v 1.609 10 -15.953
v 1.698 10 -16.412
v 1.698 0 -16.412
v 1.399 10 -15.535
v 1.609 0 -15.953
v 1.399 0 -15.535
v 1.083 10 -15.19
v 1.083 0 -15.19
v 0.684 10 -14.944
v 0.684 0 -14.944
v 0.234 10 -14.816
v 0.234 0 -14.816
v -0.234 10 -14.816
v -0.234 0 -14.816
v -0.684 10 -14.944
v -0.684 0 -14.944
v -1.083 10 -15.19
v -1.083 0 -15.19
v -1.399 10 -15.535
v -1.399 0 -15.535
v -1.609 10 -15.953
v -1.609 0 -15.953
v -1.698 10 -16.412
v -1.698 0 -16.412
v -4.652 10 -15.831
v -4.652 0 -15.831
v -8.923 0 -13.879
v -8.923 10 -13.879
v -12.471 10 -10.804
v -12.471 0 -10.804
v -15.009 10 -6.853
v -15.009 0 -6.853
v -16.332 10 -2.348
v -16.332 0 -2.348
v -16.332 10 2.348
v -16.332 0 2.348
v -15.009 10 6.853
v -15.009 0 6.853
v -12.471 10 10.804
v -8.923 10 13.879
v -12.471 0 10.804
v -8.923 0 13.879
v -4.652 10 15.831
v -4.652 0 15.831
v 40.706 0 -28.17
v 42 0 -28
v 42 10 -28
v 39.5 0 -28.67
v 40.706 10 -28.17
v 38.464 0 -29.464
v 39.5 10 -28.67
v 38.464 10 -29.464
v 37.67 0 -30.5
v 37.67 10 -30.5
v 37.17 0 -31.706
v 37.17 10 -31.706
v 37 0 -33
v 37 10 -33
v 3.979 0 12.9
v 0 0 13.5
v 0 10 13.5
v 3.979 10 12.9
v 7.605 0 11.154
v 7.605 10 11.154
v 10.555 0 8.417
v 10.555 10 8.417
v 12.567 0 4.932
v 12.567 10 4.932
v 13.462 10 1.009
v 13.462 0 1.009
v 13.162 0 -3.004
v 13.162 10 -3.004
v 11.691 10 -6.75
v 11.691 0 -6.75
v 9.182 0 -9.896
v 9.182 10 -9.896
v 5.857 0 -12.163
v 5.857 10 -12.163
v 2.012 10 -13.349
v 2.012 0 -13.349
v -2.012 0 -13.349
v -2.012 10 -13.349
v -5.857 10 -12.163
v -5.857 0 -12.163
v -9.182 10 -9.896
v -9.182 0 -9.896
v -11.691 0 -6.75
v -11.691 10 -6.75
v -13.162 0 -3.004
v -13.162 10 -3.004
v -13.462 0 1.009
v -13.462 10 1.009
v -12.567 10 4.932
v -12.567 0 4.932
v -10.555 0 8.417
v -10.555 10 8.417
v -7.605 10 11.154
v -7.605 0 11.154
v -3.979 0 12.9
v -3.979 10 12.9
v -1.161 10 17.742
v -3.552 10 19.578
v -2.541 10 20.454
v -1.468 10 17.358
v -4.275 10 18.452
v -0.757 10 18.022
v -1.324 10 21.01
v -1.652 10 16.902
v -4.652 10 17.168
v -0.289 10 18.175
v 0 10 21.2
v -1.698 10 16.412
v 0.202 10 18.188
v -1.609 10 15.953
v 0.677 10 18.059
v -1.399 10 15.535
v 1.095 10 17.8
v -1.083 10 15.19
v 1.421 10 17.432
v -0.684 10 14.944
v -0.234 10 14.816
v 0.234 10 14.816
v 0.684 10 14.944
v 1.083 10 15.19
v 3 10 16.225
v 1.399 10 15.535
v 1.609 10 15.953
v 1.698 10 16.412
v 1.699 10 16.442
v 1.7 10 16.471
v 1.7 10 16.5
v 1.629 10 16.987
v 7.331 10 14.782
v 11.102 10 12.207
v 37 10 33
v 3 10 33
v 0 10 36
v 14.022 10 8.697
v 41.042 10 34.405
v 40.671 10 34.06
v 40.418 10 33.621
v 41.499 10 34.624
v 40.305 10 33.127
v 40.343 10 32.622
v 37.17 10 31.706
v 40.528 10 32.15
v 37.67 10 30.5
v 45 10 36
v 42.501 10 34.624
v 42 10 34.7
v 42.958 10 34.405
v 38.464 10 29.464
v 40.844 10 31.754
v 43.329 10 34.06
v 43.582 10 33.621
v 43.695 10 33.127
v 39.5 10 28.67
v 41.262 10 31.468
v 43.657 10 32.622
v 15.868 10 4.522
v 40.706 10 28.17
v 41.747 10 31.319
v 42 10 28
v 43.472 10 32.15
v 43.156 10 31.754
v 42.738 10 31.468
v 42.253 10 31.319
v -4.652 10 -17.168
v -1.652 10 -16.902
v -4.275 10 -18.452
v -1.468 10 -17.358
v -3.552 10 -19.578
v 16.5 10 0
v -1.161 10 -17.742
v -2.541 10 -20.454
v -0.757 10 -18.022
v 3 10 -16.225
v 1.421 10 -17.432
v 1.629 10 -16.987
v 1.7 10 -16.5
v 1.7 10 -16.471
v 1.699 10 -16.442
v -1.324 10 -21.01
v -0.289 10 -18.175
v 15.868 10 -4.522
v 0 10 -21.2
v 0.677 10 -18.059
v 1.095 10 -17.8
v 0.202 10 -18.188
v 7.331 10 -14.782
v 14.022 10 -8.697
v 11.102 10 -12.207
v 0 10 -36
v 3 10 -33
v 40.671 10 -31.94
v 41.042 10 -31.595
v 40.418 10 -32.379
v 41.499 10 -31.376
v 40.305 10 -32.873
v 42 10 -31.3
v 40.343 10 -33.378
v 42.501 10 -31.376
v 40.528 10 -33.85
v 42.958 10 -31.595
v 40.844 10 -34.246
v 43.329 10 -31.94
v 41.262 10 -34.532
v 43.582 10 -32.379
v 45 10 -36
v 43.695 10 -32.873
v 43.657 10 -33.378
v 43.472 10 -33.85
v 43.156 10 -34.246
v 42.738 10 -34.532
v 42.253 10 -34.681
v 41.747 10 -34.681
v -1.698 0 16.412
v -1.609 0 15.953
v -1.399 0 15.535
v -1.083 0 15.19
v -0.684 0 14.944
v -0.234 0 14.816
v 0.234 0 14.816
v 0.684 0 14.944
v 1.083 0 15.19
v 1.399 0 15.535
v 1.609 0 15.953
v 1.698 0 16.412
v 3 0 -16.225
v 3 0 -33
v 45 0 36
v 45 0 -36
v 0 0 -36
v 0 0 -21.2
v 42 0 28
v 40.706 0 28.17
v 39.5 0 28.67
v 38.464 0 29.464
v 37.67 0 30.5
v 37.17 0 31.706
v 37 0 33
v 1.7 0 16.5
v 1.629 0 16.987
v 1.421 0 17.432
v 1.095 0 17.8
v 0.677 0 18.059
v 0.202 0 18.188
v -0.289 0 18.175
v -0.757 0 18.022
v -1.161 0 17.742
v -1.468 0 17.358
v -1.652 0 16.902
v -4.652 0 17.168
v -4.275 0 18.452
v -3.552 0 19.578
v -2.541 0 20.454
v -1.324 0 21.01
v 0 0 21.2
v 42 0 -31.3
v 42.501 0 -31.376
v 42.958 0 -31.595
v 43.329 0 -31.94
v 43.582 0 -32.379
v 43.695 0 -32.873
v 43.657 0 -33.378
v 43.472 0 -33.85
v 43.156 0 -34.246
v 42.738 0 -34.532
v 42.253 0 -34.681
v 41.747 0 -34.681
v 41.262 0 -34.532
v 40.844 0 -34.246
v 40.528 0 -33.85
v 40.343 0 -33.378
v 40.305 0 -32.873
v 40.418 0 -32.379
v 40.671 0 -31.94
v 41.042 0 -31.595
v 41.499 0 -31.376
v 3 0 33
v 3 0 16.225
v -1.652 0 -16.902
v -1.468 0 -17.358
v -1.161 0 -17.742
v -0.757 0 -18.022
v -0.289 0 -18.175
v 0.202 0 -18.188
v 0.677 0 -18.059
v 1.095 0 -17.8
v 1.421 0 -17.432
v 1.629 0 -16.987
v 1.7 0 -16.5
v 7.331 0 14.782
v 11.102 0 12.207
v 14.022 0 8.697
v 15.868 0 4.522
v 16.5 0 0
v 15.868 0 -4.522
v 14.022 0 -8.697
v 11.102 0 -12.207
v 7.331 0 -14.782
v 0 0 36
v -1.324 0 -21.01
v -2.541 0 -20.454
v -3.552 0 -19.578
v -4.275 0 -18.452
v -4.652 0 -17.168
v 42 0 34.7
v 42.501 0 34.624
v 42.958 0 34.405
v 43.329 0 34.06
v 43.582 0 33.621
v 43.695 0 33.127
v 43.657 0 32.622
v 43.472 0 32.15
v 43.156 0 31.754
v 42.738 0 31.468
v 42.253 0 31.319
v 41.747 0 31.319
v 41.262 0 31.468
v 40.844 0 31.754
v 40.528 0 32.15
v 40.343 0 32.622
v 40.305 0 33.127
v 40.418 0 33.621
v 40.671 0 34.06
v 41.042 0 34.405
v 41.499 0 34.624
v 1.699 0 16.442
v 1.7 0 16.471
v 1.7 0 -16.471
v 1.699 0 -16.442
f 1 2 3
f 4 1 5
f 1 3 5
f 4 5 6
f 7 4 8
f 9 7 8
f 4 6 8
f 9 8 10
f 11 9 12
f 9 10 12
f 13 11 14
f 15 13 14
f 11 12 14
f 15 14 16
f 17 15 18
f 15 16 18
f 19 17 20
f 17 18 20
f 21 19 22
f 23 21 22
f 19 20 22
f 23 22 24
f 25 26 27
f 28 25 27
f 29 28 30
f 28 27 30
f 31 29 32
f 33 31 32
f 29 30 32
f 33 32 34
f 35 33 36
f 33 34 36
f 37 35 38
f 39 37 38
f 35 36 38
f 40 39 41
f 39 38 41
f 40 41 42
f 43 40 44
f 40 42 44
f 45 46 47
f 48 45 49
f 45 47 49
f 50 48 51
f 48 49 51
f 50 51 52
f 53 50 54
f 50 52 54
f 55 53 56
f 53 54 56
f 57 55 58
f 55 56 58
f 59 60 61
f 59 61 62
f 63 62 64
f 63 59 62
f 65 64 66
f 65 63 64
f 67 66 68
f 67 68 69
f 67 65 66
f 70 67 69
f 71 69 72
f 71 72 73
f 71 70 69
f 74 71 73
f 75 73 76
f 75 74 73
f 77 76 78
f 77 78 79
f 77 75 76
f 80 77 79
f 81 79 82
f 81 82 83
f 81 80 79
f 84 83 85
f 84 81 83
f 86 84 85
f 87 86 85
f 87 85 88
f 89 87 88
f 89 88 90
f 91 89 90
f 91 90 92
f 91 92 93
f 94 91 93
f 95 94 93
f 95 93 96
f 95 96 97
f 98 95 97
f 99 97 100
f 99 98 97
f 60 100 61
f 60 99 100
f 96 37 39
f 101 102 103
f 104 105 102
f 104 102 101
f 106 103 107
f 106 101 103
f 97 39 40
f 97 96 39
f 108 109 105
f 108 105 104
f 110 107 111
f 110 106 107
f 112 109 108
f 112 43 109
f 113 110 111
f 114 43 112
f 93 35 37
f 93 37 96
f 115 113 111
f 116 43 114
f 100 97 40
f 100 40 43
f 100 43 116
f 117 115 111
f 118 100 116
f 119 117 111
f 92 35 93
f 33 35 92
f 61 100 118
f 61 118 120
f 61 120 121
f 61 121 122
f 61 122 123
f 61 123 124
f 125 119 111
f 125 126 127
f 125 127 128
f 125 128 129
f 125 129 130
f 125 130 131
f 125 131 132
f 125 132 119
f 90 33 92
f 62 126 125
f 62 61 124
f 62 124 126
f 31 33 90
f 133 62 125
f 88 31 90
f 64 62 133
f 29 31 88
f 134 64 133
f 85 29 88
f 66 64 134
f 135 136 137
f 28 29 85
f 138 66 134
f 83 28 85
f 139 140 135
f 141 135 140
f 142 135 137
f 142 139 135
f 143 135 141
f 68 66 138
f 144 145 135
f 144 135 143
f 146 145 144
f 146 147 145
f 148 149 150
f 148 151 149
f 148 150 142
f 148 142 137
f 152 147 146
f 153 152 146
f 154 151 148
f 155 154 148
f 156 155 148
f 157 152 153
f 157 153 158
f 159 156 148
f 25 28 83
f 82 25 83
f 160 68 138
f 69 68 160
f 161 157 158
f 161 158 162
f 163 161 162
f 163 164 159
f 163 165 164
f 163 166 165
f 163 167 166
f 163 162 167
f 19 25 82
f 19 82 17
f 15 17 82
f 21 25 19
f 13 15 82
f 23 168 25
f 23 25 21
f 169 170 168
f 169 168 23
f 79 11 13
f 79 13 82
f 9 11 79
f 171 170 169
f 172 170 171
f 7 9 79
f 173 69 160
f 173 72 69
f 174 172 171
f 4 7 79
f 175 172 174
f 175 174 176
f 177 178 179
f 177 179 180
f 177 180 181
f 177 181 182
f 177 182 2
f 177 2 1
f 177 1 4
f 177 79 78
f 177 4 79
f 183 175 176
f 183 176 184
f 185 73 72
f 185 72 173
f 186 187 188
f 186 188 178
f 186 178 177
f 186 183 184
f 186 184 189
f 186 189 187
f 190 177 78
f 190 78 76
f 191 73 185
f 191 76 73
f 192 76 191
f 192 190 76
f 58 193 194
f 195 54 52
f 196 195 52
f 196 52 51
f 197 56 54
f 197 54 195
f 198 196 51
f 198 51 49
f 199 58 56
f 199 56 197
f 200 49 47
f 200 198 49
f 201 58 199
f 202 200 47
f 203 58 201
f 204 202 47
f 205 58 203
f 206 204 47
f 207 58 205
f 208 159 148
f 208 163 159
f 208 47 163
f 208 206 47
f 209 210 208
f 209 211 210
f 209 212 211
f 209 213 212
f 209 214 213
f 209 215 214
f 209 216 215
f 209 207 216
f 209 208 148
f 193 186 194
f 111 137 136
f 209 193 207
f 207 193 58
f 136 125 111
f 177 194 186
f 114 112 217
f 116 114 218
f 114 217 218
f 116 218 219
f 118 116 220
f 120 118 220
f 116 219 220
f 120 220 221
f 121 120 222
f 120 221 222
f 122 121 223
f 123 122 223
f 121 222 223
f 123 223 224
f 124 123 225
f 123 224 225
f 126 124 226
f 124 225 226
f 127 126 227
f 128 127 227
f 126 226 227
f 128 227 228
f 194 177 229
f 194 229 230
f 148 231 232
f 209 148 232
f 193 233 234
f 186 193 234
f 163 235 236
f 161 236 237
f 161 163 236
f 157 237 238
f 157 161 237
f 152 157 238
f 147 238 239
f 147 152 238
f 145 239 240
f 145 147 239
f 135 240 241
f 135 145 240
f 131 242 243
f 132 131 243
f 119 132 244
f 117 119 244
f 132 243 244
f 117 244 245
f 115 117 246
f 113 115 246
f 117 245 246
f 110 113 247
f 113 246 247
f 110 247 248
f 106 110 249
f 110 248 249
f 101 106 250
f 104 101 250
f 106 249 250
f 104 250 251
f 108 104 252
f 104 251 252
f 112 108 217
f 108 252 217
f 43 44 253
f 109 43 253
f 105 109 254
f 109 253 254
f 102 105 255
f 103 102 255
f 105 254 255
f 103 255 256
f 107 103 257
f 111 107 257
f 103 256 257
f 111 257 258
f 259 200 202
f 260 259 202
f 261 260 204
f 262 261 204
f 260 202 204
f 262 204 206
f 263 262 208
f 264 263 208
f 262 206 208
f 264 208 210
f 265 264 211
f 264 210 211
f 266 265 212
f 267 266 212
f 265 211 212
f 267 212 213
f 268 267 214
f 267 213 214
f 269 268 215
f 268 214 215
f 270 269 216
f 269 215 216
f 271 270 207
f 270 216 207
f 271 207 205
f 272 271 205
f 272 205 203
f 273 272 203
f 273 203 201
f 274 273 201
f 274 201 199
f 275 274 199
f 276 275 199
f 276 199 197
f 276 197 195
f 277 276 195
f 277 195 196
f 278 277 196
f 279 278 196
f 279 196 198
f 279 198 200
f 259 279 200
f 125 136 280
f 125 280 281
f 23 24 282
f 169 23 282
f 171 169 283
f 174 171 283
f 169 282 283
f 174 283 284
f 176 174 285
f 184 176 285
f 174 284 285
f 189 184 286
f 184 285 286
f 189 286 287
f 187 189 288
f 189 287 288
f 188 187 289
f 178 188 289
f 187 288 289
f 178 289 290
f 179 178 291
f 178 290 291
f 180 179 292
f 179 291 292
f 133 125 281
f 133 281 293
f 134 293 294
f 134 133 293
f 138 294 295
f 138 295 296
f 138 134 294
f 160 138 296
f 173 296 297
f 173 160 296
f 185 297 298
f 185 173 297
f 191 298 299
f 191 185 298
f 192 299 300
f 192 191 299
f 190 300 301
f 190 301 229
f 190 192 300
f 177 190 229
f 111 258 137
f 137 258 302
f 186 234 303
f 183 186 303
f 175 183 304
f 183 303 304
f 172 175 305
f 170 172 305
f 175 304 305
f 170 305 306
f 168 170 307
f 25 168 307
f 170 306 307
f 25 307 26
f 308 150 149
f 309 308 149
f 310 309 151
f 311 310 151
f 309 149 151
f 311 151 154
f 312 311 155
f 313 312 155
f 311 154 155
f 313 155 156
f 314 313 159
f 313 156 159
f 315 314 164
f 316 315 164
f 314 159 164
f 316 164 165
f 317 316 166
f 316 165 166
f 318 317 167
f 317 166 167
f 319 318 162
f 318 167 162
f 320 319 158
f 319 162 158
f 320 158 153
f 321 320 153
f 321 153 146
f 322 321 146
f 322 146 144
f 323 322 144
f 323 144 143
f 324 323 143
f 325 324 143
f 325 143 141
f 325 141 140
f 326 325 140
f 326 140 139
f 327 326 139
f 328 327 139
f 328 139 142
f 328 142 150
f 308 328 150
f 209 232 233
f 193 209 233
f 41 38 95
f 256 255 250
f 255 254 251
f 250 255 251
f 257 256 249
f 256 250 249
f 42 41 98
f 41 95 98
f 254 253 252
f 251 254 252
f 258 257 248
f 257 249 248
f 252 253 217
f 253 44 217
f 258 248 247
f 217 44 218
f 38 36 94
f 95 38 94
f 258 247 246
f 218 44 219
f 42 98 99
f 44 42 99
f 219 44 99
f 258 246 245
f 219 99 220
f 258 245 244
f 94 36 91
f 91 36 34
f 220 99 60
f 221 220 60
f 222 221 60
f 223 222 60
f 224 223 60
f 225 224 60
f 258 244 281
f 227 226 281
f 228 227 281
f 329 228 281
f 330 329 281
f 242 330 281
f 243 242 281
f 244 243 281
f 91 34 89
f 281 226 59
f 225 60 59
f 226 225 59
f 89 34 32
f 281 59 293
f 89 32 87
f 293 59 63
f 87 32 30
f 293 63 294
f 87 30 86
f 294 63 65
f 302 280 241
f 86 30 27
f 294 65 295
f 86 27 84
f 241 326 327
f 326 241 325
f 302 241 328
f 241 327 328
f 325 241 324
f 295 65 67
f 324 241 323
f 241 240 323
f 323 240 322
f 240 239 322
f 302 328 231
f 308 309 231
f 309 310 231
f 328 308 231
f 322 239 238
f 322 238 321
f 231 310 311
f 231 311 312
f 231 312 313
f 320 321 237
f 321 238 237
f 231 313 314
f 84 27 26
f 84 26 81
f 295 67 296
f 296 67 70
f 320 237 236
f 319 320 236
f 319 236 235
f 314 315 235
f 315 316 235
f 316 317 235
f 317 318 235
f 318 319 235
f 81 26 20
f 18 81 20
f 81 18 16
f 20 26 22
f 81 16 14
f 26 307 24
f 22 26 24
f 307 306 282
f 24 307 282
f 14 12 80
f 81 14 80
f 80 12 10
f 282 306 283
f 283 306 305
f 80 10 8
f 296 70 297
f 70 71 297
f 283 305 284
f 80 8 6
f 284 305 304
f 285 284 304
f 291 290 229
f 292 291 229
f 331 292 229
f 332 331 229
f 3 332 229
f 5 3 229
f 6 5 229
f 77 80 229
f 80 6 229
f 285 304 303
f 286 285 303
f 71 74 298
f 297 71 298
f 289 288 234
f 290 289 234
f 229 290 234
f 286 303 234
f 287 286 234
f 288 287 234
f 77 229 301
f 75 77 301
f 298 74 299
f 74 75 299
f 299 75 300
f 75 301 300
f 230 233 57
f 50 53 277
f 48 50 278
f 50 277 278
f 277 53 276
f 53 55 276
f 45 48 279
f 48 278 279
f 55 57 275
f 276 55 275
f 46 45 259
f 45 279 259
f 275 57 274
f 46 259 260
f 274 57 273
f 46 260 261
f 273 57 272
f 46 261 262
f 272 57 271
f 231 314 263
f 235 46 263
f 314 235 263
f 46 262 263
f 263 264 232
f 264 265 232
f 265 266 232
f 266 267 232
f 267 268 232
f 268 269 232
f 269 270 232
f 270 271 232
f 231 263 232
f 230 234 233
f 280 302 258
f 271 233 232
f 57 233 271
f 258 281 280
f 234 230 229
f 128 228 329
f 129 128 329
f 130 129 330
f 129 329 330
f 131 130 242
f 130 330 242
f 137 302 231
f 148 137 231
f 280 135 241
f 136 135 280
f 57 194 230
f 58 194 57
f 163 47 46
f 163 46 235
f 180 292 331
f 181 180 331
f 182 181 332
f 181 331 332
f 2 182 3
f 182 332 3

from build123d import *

# Parameters (mm, degrees)
SKETCH2_R           = 13.5
BOSS_EXTRUDE2_DEPTH = 10
CUT_EXTRUDE1_DEPTH  = 59.489315264
BOSS_EXTRUDE3_DEPTH = 10
SKETCH5_R           = 1.7
CUT_EXTRUDE3_DEPTH  = 59.489315264


with BuildPart() as part:
    # Sketch2 → Boss-Extrude2 (new body)
    # profile 1 of 4: a face of its own
    with BuildSketch(Plane(origin=(0, 0, 0), x_dir=(1, 0, 0), z_dir=(0, 1, 0))):
        with BuildLine():
            ThreePointArc((4.652086817, 15.830606061), (3.552193091, 19.577649142), (0, 21.2))
            ThreePointArc((0, 21.2), (-3.552193091, 19.577649142), (-4.652086817, 15.830606061))
            ThreePointArc((-4.652086817, 15.830606061), (-3.188214551, 16.189048396), (-1.697742762, 16.412424242))
            ThreePointArc((-1.697742762, 16.412424242), (-0.043802421, 18.199435597), (1.7, 16.5))
            ThreePointArc((1.7, 16.5), (1.699435597, 16.456197579), (1.697742762, 16.412424242))
            ThreePointArc((1.697742762, 16.412424242), (3.188214551, 16.189048396), (4.652086817, 15.830606061))
        make_face()
    # profile 2 of 4: a face of its own
    with BuildSketch(Plane(origin=(0, 0, 0), x_dir=(1, 0, 0), z_dir=(0, 1, 0))):
        with BuildLine():
            ThreePointArc((-1.697742762, 16.412424242), (-3.188214551, 16.189048396), (-4.652086817, 15.830606061))
            ThreePointArc((-4.652086817, 15.830606061), (-16.5, 0), (-4.652086817, -15.830606061))
            ThreePointArc((-4.652086817, -15.830606061), (-3.188214551, -16.189048396), (-1.697742762, -16.412424242))
            ThreePointArc((-1.697742762, -16.412424242), (0, -14.8), (1.697742762, -16.412424242))
            ThreePointArc((1.697742762, -16.412424242), (3.188214551, -16.189048396), (4.652086817, -15.830606061))
            ThreePointArc((4.652086817, -15.830606061), (16.5, 0), (4.652086817, 15.830606061))
            ThreePointArc((4.652086817, 15.830606061), (3.188214551, 16.189048396), (1.697742762, 16.412424242))
            ThreePointArc((1.697742762, 16.412424242), (0, 14.8), (-1.697742762, 16.412424242))
        make_face()
        with Locations(Location((0, 0, 0), (0, 0, 270))):
            Circle(SKETCH2_R, mode=Mode.SUBTRACT)
    # profile 3 of 4: a face of its own
    with BuildSketch(Plane(origin=(0, 0, 0), x_dir=(1, 0, 0), z_dir=(0, 1, 0))):
        with BuildLine():
            ThreePointArc((-1.697742762, -16.412424242), (-3.188214551, -16.189048396), (-4.652086817, -15.830606061))
            ThreePointArc((-4.652086817, -15.830606061), (-3.552193091, -19.577649142), (0, -21.2))
            ThreePointArc((0, -21.2), (3.552193091, -19.577649142), (4.652086817, -15.830606061))
            ThreePointArc((4.652086817, -15.830606061), (3.188214551, -16.189048396), (1.697742762, -16.412424242))
            ThreePointArc((1.697742762, -16.412424242), (1.699435597, -16.456197579), (1.7, -16.5))
            ThreePointArc((1.7, -16.5), (-0.043802421, -18.199435597), (-1.697742762, -16.412424242))
        make_face()
    # profile 4 of 4: a face of its own
    with BuildSketch(Plane(origin=(0, 0, 0), x_dir=(1, 0, 0), z_dir=(0, 1, 0))):
        with BuildLine():
            Line((0, 36), (0, 21.2))
            ThreePointArc((0, 21.2), (3.552193091, 19.577649142), (4.652086817, 15.830606061))
            ThreePointArc((4.652086817, 15.830606061), (16.5, 0), (4.652086817, -15.830606061))
            ThreePointArc((4.652086817, -15.830606061), (3.552193091, -19.577649142), (0, -21.2))
            Line((0, -21.2), (0, -36))
            Line((0, -36), (45, -36))
            Line((45, -36), (45, 36))
            Line((45, 36), (0, 36))
        make_face()
    extrude(amount=BOSS_EXTRUDE2_DEPTH)

    # Sketch3 → Cut-Extrude1 (cut, through all)
    with BuildSketch(Plane(origin=(0, 10, 0), x_dir=(1, 0, 0), z_dir=(0, 1, 0))):
        with BuildLine():
            Line((3, 16.22498074), (3, 33))
            Line((3, 33), (42, 33))
            Line((42, 33), (42, -33))
            Line((42, -33), (3, -33))
            Line((3, -33), (3, -16.22498074))
            ThreePointArc((3, -16.22498074), (16.5, 0), (3, 16.22498074))
        make_face()
    extrude(amount=-CUT_EXTRUDE1_DEPTH, mode=Mode.SUBTRACT)

    # Sketch4 → Boss-Extrude3 (add, through all)
    with BuildSketch(Plane(origin=(0, 10, 0), x_dir=(1, 0, 0), z_dir=(0, 1, 0))):
        with BuildLine():
            Line((37, -33), (42, -33))
            Line((42, -33), (42, -28))
            ThreePointArc((42, -28), (38.464466094, -29.464466094), (37, -33))
        make_face()
        with BuildLine():
            Line((37, 33), (42, 33))
            Line((42, 33), (42, 28))
            ThreePointArc((42, 28), (38.464466094, 29.464466094), (37, 33))
        make_face()
    extrude(amount=-BOSS_EXTRUDE3_DEPTH)

    # Sketch5 → Cut-Extrude3 (cut, through all)
    with BuildSketch(Plane(origin=(0, 10, 0), x_dir=(1, 0, 0), z_dir=(0, 1, 0))):
        with Locations(Location((42, 33, 0), (0, 0, 270))):
            Circle(SKETCH5_R)
        with Locations(Location((42, -33, 0), (0, 0, 270))):
            Circle(SKETCH5_R)
    extrude(amount=-CUT_EXTRUDE3_DEPTH, mode=Mode.SUBTRACT)


solid = part.part
